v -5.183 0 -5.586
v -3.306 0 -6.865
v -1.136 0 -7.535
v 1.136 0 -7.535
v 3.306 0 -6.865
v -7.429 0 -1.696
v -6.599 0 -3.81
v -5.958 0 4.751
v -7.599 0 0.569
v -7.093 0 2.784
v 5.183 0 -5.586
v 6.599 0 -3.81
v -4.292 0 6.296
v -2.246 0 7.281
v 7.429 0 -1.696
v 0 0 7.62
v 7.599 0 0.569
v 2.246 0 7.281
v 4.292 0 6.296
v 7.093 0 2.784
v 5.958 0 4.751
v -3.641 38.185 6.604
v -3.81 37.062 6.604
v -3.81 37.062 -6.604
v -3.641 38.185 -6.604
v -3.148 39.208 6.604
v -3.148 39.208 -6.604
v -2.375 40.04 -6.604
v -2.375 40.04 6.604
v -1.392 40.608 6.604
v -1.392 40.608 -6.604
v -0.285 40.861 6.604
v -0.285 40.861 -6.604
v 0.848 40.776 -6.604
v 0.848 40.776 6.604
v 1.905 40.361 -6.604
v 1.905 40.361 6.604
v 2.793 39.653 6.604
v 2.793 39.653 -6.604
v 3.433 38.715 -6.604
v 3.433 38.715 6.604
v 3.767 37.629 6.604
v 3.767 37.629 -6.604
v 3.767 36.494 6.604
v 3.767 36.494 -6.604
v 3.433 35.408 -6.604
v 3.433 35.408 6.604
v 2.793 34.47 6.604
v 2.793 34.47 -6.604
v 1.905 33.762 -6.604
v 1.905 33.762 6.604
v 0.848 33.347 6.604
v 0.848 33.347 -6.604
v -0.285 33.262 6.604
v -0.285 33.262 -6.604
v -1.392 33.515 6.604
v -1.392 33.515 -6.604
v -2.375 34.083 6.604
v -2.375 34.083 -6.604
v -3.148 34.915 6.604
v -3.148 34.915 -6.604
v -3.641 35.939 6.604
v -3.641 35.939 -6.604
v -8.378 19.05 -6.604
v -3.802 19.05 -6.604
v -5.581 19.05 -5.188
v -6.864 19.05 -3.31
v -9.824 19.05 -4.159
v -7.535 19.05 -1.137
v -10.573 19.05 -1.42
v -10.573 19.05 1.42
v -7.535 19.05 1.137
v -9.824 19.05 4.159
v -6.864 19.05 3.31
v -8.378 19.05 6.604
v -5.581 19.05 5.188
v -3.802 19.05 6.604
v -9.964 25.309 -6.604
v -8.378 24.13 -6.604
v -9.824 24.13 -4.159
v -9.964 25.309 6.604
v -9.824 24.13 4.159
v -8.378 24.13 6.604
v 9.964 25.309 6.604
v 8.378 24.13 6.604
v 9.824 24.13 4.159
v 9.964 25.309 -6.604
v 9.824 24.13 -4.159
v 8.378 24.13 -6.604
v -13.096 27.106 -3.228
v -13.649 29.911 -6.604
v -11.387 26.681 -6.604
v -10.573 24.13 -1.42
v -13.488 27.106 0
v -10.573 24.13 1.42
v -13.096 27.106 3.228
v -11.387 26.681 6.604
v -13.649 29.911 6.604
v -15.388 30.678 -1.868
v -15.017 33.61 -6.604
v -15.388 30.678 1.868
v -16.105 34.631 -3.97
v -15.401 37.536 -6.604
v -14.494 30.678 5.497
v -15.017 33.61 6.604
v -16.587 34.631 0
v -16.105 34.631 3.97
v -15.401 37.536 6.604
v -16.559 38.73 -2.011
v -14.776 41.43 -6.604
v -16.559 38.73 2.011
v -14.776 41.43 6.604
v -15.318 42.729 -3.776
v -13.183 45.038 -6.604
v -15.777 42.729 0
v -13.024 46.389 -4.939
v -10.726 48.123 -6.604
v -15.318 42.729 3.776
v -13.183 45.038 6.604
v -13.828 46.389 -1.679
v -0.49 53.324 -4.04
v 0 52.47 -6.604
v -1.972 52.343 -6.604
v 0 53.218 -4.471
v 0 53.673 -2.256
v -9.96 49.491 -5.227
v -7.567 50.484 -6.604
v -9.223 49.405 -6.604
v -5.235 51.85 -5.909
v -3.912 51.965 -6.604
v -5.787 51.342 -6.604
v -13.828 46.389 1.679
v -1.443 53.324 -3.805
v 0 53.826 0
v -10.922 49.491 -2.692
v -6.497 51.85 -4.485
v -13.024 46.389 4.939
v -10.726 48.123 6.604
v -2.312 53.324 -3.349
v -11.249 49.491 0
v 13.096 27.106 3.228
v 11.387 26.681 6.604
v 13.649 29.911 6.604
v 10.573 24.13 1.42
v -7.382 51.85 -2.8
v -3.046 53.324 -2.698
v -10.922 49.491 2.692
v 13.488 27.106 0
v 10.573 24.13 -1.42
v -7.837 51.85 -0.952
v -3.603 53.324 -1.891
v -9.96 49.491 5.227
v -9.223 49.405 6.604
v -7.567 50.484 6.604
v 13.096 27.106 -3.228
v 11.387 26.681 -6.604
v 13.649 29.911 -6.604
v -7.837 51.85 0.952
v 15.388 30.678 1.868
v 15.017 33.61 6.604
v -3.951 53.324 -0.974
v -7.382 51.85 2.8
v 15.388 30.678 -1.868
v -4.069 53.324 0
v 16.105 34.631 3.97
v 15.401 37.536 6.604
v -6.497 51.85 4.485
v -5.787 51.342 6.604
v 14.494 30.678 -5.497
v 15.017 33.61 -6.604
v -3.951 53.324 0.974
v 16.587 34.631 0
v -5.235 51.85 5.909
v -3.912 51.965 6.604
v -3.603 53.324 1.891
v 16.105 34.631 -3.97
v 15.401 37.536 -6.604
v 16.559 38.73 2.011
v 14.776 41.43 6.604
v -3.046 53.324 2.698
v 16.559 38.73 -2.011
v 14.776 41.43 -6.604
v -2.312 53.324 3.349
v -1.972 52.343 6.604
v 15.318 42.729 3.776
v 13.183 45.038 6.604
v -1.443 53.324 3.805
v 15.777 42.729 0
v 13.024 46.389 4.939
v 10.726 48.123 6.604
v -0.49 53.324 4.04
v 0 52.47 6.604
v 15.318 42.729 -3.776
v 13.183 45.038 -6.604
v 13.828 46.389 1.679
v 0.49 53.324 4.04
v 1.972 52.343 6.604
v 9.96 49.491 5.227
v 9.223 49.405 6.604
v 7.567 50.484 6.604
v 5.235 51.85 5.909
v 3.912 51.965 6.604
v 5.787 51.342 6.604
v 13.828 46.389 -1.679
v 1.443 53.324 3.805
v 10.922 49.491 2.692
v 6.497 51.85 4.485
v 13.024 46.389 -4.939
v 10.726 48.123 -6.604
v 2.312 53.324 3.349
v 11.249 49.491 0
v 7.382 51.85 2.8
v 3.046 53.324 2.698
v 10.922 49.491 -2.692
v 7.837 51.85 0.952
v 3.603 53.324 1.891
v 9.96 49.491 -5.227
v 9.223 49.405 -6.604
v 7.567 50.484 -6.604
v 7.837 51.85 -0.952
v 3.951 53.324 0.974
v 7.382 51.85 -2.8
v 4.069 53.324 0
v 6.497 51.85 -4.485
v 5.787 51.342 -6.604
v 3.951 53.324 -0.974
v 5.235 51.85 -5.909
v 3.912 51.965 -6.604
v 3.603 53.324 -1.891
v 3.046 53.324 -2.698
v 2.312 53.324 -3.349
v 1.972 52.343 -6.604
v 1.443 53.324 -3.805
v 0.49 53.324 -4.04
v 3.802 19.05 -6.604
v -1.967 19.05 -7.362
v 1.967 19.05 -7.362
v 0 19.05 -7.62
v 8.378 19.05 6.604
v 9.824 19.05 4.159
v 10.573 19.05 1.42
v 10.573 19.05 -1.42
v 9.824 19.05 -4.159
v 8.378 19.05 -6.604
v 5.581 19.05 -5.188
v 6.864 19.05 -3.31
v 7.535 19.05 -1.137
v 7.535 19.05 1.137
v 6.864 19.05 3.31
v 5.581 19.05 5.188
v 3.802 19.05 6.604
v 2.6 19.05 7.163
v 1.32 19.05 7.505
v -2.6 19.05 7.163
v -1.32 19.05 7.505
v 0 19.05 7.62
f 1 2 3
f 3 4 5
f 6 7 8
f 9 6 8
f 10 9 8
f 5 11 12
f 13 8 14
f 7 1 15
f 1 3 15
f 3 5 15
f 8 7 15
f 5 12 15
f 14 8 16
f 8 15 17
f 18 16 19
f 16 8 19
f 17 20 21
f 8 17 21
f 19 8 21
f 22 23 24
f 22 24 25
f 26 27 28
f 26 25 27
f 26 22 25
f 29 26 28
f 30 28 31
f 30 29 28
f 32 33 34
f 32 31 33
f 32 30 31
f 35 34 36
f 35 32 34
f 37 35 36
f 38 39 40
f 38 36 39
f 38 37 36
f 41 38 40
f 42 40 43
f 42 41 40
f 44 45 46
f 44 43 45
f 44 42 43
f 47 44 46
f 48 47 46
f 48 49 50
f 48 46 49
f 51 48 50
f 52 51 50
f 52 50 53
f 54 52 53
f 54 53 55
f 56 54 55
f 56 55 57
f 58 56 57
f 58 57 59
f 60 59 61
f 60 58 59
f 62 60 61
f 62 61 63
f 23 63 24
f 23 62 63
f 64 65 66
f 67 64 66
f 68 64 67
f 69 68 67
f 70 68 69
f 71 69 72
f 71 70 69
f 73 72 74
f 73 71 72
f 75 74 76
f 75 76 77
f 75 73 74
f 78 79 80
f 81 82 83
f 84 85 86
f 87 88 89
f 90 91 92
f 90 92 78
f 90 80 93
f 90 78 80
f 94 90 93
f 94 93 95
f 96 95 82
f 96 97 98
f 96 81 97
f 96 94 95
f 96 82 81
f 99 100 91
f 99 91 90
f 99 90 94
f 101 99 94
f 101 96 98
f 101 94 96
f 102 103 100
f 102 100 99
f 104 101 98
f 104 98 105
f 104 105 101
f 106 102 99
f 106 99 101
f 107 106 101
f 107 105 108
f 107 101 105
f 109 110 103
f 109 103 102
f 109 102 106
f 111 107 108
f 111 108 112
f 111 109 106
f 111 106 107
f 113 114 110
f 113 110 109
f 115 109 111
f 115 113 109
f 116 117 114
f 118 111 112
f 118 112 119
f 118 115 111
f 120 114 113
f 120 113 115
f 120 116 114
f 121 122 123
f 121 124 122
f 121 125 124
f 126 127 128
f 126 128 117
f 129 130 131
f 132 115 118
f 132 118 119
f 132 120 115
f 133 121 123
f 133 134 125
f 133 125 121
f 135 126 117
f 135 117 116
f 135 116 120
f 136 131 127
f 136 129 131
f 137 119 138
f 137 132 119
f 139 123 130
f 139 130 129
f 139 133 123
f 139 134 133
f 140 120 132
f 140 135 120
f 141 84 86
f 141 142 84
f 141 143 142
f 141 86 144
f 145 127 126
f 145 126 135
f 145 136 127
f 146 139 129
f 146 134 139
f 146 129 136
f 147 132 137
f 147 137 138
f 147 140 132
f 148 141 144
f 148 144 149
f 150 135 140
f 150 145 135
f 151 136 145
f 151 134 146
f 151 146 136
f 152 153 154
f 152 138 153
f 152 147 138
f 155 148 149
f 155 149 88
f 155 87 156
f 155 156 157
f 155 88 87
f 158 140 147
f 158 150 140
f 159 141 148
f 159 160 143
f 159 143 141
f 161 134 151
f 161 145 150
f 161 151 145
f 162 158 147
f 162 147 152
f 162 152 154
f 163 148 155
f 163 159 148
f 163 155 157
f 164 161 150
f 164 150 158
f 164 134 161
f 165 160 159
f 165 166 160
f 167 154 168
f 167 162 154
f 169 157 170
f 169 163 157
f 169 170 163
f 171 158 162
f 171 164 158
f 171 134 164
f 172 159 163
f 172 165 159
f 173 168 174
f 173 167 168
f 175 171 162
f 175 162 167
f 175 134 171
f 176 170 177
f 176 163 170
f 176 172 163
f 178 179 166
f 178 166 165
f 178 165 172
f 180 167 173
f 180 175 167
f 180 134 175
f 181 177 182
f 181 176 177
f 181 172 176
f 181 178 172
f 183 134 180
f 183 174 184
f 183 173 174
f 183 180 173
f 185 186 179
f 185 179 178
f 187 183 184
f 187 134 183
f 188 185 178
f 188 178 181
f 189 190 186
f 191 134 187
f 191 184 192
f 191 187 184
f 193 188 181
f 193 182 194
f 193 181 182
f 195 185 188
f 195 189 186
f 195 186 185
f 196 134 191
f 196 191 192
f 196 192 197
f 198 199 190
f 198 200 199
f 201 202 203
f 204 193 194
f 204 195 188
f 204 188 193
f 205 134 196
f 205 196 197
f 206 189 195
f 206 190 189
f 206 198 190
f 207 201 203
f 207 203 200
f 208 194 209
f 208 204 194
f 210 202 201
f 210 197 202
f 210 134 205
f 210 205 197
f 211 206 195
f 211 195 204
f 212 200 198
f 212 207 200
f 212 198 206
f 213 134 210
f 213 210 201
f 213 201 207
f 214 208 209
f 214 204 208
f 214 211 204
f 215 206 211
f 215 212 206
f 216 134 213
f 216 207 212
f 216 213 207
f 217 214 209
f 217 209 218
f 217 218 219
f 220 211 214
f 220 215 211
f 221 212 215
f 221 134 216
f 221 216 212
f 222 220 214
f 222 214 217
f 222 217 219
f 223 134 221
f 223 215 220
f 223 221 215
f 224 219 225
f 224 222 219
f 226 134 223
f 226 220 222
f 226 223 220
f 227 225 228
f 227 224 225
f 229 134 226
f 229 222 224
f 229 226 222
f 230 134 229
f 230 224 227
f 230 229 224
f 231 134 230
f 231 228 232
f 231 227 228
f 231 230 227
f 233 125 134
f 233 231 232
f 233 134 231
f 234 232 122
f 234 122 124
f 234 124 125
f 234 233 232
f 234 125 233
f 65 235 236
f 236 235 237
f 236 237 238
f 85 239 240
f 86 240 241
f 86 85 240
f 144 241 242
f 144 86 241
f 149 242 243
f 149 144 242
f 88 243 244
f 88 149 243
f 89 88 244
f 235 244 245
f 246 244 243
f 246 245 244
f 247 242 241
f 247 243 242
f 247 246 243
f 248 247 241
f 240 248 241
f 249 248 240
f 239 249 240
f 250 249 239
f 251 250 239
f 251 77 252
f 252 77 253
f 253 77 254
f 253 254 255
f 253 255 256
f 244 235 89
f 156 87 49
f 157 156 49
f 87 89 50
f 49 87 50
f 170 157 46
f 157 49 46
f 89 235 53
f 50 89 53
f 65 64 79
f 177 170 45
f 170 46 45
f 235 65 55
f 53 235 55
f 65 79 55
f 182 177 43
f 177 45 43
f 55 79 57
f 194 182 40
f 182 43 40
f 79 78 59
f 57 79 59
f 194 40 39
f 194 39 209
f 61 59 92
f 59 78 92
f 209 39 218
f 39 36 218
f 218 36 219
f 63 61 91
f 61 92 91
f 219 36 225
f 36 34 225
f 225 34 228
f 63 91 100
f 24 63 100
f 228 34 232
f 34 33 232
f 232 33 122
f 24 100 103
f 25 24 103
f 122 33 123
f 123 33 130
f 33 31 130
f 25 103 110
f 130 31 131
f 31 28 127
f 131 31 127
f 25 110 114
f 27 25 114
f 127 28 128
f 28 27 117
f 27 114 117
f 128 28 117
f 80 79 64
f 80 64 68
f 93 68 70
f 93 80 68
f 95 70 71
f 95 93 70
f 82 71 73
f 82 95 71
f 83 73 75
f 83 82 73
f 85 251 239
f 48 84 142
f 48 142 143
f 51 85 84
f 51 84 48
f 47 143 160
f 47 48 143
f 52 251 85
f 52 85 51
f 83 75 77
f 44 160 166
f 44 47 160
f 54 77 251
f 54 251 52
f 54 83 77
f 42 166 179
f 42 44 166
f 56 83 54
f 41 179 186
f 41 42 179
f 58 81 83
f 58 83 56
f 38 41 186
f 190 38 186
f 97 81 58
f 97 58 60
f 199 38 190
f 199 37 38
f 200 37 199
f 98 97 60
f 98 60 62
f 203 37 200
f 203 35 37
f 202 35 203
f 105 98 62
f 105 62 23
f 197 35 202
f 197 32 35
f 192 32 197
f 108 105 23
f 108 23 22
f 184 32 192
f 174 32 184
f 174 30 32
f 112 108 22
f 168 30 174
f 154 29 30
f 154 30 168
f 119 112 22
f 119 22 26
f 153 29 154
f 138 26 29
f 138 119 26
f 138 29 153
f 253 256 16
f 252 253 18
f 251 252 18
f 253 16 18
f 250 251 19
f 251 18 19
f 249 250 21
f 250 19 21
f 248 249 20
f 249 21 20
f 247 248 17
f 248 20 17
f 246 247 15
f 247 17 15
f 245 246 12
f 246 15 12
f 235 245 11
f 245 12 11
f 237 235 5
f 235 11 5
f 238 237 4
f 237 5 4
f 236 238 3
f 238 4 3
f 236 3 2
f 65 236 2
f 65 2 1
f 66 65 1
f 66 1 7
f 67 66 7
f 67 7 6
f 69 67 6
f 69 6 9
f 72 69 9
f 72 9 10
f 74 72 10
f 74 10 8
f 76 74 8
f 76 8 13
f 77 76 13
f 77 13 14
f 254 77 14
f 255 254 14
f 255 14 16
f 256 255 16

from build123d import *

# Parameters (mm, degrees)
SKETCH1_R               = 7.62
BOSS_EXTRUDE1_DEPTH     = 19.05
CUT_EXTRUDE1_DEPTH      = 59.815433775
CUT_EXTRUDE1_DEPTH_BACK = 59.815433775
SKETCH3_W               = 21.634870399
SKETCH3_H               = 44.538154166
SKETCH3_W_2             = 24.953070172
CUT_EXTRUDE2_DEPTH      = 59.142460648
CUT_EXTRUDE2_DEPTH_BACK = 59.142460648
SKETCH4_R               = 3.81


with BuildPart() as part:
    # Sketch1 → Boss-Extrude1 (new body)
    with BuildSketch(Plane(origin=(0, 0, 0), x_dir=(1, 0, 0), z_dir=(0, 1, 0))):
        with Locations(Location((0, 0, 0), (0, 0, 270))):
            Circle(SKETCH1_R)
    extrude(amount=BOSS_EXTRUDE1_DEPTH)

    # Sketch2 → Revolve1 (revolve)
    with BuildSketch(Plane(origin=(0, 0, 0), x_dir=(0, 0, -1), z_dir=(1, 0, 0)), mode=Mode.PRIVATE) as revolve1_sk:
        with BuildLine():
            Line((-10.668, 19.05), (-10.668, 24.13))
            ThreePointArc((-10.668, 24.13), (-15.776826607, 42.729323061), (0, 53.825568814))
            Line((0, 53.825568814), (0, 19.05))
            Line((0, 19.05), (-10.668, 19.05))
        make_face()
    revolve(revolve1_sk.sketch.rotate(Axis((0, 19.05, 0), (0, 1, 0)), 180), axis=Axis((0, 19.05, 0), (0, 1, 0)))

    # Sketch3 → Cut-Extrude1 (cut, two sides: drawn at the far end of the back side and taken through both)
    with BuildSketch(Plane(origin=(0, 0, 0), x_dir=(0, 0, -1), z_dir=(1, 0, 0)).offset(-CUT_EXTRUDE1_DEPTH_BACK)):
        with Locations((-17.4214352, 41.319077083)):
            Rectangle(SKETCH3_W, SKETCH3_H)
        with Locations((19.080535086, 41.319077083)):
            Rectangle(SKETCH3_W_2, SKETCH3_H)
    extrude(amount=CUT_EXTRUDE1_DEPTH + CUT_EXTRUDE1_DEPTH_BACK, mode=Mode.SUBTRACT)

    # Sketch4 → Cut-Extrude2 (cut, two sides: drawn at the far end of the back side and taken through both)
    with BuildSketch(Plane(origin=(0, 0, -6.604), x_dir=(-1, 0, 0), z_dir=(0, 0, -1)).offset(-CUT_EXTRUDE2_DEPTH_BACK)):
        with Locations((0, 37.061568814)):
            Circle(SKETCH4_R)
    extrude(amount=CUT_EXTRUDE2_DEPTH + CUT_EXTRUDE2_DEPTH_BACK, mode=Mode.SUBTRACT)


solid = part.part
